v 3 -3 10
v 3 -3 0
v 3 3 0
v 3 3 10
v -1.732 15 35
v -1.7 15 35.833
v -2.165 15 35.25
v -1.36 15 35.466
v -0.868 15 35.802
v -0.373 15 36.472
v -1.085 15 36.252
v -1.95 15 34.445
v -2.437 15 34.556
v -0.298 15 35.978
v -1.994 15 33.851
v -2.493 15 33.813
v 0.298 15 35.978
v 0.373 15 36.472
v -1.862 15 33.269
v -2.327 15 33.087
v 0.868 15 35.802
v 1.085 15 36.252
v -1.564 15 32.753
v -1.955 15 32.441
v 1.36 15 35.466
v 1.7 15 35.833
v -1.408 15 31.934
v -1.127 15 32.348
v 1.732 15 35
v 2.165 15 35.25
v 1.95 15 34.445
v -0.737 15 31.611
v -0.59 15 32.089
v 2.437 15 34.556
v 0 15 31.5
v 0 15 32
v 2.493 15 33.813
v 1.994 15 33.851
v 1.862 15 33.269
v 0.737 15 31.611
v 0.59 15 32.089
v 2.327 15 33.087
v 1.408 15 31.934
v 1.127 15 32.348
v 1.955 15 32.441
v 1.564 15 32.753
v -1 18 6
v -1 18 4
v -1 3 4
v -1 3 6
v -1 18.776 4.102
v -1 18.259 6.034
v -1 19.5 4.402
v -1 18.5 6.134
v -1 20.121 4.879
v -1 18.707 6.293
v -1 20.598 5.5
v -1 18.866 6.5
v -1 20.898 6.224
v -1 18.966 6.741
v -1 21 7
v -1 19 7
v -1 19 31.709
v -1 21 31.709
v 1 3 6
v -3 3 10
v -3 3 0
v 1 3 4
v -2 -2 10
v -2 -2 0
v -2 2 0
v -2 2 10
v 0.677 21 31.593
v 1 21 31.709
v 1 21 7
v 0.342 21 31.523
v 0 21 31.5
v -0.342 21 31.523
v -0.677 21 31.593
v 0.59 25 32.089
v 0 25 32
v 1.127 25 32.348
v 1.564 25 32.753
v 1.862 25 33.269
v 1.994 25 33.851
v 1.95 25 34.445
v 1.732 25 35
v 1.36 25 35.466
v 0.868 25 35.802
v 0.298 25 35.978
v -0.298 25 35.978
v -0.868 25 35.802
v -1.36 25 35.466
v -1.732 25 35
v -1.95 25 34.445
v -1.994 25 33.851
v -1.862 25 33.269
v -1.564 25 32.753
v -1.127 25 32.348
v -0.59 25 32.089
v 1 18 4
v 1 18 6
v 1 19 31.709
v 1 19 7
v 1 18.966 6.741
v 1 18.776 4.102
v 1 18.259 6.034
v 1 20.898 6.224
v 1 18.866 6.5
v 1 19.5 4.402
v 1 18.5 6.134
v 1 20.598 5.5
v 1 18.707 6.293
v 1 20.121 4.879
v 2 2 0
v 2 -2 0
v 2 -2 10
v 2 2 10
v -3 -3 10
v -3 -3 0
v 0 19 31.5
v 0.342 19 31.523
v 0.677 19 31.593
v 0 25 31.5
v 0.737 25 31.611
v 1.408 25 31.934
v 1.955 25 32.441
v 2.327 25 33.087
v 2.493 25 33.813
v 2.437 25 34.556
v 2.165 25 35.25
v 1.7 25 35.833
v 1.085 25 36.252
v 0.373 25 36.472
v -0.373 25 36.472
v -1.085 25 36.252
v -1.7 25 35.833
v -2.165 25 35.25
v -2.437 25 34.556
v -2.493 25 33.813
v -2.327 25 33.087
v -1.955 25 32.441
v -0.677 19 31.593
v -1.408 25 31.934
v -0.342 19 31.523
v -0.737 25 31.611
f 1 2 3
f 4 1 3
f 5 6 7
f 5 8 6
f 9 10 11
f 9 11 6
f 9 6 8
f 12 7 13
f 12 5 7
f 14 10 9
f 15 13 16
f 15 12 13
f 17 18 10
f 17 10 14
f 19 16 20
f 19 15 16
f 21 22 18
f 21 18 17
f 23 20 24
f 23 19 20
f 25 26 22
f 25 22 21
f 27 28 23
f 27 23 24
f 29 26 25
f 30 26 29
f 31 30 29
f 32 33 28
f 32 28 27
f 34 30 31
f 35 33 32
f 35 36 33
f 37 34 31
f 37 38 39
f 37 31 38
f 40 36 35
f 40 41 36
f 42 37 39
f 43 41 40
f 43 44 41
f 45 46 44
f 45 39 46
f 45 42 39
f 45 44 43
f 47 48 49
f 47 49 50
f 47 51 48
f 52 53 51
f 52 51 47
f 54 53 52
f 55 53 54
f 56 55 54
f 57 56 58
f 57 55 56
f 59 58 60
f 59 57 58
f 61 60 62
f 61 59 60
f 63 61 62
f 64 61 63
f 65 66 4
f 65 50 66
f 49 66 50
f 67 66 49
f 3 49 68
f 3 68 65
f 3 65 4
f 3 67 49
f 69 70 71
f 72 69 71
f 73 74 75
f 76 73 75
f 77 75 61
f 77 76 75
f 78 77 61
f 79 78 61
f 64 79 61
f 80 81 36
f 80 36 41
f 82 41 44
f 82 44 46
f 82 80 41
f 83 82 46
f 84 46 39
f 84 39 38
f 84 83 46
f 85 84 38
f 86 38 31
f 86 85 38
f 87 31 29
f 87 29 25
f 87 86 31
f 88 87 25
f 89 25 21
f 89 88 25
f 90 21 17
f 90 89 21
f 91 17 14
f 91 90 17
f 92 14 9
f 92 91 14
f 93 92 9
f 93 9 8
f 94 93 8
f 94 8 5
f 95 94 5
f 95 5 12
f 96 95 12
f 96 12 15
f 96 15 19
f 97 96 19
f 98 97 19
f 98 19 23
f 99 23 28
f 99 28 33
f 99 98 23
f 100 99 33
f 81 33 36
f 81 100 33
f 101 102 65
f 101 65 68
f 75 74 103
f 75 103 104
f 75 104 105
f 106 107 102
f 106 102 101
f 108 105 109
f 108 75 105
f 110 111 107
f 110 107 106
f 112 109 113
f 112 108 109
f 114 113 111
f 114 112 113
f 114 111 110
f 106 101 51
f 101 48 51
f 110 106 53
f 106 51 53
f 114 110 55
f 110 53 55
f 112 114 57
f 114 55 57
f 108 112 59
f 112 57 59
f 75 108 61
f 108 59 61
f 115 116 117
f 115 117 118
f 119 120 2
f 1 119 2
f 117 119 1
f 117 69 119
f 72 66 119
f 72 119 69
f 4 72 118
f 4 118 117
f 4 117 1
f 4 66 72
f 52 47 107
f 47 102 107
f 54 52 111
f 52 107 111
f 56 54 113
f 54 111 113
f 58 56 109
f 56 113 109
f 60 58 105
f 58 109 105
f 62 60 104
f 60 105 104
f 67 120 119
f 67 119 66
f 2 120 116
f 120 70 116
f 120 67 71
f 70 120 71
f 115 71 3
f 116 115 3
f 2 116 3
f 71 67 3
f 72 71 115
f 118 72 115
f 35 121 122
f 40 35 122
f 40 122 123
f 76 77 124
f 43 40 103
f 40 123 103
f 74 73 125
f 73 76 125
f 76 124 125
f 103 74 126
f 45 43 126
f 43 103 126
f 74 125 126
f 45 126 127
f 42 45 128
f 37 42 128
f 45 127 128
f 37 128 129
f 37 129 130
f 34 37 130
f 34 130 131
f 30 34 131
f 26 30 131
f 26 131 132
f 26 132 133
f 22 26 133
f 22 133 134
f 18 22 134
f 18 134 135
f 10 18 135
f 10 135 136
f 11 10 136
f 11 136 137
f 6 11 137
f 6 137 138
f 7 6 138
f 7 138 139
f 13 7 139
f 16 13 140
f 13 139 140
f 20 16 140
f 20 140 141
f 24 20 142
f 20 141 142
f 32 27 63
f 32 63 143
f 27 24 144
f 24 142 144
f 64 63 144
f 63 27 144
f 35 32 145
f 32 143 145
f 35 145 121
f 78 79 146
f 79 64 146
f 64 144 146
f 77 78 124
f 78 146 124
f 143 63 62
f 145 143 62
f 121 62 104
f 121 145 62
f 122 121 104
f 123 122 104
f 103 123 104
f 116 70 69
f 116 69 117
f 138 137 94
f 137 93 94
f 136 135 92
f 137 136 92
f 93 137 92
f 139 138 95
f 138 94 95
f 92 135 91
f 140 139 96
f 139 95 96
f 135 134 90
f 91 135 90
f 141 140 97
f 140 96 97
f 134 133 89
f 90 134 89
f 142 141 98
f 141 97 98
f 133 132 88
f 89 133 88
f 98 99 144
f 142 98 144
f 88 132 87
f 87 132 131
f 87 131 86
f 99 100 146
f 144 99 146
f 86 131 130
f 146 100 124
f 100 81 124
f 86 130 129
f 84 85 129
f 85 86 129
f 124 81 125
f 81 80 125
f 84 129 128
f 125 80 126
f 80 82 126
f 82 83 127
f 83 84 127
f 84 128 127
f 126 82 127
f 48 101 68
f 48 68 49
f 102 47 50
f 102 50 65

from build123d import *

# Parameters (mm, degrees)
ESQUISSE1_W             = 6
ESQUISSE1_H             = 6
ESQUISSE1_W_2           = 4
ESQUISSE1_H_2           = 4
BOSS_EXTRU_1_DEPTH      = 10
ESQUISSE2_W             = 2
ESQUISSE2_H             = 2
BOSS_EXTRU_2_DEPTH      = 4
BOSS_EXTRU_2_DEPTH_BACK = 6
ESQUISSE4_R             = 2.5
ESQUISSE4_R_2           = 2


with BuildPart() as part:
    # Esquisse1 → Boss.-Extru.1 (new body)
    with BuildSketch(Plane.XY):
        Rectangle(ESQUISSE1_W, ESQUISSE1_H)
        Rectangle(ESQUISSE1_W_2, ESQUISSE1_H_2, mode=Mode.SUBTRACT)
    extrude(amount=BOSS_EXTRU_1_DEPTH)

    # Balayage1: sweep along a path in Esquisse3
    with BuildLine(Plane(origin=(0, 0, 0), x_dir=(0, 0, -1), z_dir=(1, 0, 0))) as balayage1_path:
        Line((-5, 3), (-5, 18))
        ThreePointArc((-5, 18), (-5.585786438, 19.414213562), (-7, 20))
        Line((-7, 20), (-32, 20))
    # Esquisse2 → Balayage1 (sweep)
    with BuildSketch(Plane(origin=(0, 3, 0), x_dir=(1, 0, 0), z_dir=(0, 1, 0))):
        with Locations((0, -5)):
            Rectangle(ESQUISSE2_W, ESQUISSE2_H)
    sweep(path=balayage1_path.line)

    # Esquisse4 → Boss.-Extru.2 (add, two sides: drawn at the far end of the back side and taken through both)
    with BuildSketch(Plane.XZ.offset(-19).offset(-BOSS_EXTRU_2_DEPTH_BACK)):
        with Locations(Location((0, 34, 0), (0, 0, 270))):
            Circle(ESQUISSE4_R)
        with Locations(Location((0, 34, 0), (0, 0, 270))):
            Circle(ESQUISSE4_R_2, mode=Mode.SUBTRACT)
    extrude(amount=BOSS_EXTRU_2_DEPTH + BOSS_EXTRU_2_DEPTH_BACK)


solid = part.part
